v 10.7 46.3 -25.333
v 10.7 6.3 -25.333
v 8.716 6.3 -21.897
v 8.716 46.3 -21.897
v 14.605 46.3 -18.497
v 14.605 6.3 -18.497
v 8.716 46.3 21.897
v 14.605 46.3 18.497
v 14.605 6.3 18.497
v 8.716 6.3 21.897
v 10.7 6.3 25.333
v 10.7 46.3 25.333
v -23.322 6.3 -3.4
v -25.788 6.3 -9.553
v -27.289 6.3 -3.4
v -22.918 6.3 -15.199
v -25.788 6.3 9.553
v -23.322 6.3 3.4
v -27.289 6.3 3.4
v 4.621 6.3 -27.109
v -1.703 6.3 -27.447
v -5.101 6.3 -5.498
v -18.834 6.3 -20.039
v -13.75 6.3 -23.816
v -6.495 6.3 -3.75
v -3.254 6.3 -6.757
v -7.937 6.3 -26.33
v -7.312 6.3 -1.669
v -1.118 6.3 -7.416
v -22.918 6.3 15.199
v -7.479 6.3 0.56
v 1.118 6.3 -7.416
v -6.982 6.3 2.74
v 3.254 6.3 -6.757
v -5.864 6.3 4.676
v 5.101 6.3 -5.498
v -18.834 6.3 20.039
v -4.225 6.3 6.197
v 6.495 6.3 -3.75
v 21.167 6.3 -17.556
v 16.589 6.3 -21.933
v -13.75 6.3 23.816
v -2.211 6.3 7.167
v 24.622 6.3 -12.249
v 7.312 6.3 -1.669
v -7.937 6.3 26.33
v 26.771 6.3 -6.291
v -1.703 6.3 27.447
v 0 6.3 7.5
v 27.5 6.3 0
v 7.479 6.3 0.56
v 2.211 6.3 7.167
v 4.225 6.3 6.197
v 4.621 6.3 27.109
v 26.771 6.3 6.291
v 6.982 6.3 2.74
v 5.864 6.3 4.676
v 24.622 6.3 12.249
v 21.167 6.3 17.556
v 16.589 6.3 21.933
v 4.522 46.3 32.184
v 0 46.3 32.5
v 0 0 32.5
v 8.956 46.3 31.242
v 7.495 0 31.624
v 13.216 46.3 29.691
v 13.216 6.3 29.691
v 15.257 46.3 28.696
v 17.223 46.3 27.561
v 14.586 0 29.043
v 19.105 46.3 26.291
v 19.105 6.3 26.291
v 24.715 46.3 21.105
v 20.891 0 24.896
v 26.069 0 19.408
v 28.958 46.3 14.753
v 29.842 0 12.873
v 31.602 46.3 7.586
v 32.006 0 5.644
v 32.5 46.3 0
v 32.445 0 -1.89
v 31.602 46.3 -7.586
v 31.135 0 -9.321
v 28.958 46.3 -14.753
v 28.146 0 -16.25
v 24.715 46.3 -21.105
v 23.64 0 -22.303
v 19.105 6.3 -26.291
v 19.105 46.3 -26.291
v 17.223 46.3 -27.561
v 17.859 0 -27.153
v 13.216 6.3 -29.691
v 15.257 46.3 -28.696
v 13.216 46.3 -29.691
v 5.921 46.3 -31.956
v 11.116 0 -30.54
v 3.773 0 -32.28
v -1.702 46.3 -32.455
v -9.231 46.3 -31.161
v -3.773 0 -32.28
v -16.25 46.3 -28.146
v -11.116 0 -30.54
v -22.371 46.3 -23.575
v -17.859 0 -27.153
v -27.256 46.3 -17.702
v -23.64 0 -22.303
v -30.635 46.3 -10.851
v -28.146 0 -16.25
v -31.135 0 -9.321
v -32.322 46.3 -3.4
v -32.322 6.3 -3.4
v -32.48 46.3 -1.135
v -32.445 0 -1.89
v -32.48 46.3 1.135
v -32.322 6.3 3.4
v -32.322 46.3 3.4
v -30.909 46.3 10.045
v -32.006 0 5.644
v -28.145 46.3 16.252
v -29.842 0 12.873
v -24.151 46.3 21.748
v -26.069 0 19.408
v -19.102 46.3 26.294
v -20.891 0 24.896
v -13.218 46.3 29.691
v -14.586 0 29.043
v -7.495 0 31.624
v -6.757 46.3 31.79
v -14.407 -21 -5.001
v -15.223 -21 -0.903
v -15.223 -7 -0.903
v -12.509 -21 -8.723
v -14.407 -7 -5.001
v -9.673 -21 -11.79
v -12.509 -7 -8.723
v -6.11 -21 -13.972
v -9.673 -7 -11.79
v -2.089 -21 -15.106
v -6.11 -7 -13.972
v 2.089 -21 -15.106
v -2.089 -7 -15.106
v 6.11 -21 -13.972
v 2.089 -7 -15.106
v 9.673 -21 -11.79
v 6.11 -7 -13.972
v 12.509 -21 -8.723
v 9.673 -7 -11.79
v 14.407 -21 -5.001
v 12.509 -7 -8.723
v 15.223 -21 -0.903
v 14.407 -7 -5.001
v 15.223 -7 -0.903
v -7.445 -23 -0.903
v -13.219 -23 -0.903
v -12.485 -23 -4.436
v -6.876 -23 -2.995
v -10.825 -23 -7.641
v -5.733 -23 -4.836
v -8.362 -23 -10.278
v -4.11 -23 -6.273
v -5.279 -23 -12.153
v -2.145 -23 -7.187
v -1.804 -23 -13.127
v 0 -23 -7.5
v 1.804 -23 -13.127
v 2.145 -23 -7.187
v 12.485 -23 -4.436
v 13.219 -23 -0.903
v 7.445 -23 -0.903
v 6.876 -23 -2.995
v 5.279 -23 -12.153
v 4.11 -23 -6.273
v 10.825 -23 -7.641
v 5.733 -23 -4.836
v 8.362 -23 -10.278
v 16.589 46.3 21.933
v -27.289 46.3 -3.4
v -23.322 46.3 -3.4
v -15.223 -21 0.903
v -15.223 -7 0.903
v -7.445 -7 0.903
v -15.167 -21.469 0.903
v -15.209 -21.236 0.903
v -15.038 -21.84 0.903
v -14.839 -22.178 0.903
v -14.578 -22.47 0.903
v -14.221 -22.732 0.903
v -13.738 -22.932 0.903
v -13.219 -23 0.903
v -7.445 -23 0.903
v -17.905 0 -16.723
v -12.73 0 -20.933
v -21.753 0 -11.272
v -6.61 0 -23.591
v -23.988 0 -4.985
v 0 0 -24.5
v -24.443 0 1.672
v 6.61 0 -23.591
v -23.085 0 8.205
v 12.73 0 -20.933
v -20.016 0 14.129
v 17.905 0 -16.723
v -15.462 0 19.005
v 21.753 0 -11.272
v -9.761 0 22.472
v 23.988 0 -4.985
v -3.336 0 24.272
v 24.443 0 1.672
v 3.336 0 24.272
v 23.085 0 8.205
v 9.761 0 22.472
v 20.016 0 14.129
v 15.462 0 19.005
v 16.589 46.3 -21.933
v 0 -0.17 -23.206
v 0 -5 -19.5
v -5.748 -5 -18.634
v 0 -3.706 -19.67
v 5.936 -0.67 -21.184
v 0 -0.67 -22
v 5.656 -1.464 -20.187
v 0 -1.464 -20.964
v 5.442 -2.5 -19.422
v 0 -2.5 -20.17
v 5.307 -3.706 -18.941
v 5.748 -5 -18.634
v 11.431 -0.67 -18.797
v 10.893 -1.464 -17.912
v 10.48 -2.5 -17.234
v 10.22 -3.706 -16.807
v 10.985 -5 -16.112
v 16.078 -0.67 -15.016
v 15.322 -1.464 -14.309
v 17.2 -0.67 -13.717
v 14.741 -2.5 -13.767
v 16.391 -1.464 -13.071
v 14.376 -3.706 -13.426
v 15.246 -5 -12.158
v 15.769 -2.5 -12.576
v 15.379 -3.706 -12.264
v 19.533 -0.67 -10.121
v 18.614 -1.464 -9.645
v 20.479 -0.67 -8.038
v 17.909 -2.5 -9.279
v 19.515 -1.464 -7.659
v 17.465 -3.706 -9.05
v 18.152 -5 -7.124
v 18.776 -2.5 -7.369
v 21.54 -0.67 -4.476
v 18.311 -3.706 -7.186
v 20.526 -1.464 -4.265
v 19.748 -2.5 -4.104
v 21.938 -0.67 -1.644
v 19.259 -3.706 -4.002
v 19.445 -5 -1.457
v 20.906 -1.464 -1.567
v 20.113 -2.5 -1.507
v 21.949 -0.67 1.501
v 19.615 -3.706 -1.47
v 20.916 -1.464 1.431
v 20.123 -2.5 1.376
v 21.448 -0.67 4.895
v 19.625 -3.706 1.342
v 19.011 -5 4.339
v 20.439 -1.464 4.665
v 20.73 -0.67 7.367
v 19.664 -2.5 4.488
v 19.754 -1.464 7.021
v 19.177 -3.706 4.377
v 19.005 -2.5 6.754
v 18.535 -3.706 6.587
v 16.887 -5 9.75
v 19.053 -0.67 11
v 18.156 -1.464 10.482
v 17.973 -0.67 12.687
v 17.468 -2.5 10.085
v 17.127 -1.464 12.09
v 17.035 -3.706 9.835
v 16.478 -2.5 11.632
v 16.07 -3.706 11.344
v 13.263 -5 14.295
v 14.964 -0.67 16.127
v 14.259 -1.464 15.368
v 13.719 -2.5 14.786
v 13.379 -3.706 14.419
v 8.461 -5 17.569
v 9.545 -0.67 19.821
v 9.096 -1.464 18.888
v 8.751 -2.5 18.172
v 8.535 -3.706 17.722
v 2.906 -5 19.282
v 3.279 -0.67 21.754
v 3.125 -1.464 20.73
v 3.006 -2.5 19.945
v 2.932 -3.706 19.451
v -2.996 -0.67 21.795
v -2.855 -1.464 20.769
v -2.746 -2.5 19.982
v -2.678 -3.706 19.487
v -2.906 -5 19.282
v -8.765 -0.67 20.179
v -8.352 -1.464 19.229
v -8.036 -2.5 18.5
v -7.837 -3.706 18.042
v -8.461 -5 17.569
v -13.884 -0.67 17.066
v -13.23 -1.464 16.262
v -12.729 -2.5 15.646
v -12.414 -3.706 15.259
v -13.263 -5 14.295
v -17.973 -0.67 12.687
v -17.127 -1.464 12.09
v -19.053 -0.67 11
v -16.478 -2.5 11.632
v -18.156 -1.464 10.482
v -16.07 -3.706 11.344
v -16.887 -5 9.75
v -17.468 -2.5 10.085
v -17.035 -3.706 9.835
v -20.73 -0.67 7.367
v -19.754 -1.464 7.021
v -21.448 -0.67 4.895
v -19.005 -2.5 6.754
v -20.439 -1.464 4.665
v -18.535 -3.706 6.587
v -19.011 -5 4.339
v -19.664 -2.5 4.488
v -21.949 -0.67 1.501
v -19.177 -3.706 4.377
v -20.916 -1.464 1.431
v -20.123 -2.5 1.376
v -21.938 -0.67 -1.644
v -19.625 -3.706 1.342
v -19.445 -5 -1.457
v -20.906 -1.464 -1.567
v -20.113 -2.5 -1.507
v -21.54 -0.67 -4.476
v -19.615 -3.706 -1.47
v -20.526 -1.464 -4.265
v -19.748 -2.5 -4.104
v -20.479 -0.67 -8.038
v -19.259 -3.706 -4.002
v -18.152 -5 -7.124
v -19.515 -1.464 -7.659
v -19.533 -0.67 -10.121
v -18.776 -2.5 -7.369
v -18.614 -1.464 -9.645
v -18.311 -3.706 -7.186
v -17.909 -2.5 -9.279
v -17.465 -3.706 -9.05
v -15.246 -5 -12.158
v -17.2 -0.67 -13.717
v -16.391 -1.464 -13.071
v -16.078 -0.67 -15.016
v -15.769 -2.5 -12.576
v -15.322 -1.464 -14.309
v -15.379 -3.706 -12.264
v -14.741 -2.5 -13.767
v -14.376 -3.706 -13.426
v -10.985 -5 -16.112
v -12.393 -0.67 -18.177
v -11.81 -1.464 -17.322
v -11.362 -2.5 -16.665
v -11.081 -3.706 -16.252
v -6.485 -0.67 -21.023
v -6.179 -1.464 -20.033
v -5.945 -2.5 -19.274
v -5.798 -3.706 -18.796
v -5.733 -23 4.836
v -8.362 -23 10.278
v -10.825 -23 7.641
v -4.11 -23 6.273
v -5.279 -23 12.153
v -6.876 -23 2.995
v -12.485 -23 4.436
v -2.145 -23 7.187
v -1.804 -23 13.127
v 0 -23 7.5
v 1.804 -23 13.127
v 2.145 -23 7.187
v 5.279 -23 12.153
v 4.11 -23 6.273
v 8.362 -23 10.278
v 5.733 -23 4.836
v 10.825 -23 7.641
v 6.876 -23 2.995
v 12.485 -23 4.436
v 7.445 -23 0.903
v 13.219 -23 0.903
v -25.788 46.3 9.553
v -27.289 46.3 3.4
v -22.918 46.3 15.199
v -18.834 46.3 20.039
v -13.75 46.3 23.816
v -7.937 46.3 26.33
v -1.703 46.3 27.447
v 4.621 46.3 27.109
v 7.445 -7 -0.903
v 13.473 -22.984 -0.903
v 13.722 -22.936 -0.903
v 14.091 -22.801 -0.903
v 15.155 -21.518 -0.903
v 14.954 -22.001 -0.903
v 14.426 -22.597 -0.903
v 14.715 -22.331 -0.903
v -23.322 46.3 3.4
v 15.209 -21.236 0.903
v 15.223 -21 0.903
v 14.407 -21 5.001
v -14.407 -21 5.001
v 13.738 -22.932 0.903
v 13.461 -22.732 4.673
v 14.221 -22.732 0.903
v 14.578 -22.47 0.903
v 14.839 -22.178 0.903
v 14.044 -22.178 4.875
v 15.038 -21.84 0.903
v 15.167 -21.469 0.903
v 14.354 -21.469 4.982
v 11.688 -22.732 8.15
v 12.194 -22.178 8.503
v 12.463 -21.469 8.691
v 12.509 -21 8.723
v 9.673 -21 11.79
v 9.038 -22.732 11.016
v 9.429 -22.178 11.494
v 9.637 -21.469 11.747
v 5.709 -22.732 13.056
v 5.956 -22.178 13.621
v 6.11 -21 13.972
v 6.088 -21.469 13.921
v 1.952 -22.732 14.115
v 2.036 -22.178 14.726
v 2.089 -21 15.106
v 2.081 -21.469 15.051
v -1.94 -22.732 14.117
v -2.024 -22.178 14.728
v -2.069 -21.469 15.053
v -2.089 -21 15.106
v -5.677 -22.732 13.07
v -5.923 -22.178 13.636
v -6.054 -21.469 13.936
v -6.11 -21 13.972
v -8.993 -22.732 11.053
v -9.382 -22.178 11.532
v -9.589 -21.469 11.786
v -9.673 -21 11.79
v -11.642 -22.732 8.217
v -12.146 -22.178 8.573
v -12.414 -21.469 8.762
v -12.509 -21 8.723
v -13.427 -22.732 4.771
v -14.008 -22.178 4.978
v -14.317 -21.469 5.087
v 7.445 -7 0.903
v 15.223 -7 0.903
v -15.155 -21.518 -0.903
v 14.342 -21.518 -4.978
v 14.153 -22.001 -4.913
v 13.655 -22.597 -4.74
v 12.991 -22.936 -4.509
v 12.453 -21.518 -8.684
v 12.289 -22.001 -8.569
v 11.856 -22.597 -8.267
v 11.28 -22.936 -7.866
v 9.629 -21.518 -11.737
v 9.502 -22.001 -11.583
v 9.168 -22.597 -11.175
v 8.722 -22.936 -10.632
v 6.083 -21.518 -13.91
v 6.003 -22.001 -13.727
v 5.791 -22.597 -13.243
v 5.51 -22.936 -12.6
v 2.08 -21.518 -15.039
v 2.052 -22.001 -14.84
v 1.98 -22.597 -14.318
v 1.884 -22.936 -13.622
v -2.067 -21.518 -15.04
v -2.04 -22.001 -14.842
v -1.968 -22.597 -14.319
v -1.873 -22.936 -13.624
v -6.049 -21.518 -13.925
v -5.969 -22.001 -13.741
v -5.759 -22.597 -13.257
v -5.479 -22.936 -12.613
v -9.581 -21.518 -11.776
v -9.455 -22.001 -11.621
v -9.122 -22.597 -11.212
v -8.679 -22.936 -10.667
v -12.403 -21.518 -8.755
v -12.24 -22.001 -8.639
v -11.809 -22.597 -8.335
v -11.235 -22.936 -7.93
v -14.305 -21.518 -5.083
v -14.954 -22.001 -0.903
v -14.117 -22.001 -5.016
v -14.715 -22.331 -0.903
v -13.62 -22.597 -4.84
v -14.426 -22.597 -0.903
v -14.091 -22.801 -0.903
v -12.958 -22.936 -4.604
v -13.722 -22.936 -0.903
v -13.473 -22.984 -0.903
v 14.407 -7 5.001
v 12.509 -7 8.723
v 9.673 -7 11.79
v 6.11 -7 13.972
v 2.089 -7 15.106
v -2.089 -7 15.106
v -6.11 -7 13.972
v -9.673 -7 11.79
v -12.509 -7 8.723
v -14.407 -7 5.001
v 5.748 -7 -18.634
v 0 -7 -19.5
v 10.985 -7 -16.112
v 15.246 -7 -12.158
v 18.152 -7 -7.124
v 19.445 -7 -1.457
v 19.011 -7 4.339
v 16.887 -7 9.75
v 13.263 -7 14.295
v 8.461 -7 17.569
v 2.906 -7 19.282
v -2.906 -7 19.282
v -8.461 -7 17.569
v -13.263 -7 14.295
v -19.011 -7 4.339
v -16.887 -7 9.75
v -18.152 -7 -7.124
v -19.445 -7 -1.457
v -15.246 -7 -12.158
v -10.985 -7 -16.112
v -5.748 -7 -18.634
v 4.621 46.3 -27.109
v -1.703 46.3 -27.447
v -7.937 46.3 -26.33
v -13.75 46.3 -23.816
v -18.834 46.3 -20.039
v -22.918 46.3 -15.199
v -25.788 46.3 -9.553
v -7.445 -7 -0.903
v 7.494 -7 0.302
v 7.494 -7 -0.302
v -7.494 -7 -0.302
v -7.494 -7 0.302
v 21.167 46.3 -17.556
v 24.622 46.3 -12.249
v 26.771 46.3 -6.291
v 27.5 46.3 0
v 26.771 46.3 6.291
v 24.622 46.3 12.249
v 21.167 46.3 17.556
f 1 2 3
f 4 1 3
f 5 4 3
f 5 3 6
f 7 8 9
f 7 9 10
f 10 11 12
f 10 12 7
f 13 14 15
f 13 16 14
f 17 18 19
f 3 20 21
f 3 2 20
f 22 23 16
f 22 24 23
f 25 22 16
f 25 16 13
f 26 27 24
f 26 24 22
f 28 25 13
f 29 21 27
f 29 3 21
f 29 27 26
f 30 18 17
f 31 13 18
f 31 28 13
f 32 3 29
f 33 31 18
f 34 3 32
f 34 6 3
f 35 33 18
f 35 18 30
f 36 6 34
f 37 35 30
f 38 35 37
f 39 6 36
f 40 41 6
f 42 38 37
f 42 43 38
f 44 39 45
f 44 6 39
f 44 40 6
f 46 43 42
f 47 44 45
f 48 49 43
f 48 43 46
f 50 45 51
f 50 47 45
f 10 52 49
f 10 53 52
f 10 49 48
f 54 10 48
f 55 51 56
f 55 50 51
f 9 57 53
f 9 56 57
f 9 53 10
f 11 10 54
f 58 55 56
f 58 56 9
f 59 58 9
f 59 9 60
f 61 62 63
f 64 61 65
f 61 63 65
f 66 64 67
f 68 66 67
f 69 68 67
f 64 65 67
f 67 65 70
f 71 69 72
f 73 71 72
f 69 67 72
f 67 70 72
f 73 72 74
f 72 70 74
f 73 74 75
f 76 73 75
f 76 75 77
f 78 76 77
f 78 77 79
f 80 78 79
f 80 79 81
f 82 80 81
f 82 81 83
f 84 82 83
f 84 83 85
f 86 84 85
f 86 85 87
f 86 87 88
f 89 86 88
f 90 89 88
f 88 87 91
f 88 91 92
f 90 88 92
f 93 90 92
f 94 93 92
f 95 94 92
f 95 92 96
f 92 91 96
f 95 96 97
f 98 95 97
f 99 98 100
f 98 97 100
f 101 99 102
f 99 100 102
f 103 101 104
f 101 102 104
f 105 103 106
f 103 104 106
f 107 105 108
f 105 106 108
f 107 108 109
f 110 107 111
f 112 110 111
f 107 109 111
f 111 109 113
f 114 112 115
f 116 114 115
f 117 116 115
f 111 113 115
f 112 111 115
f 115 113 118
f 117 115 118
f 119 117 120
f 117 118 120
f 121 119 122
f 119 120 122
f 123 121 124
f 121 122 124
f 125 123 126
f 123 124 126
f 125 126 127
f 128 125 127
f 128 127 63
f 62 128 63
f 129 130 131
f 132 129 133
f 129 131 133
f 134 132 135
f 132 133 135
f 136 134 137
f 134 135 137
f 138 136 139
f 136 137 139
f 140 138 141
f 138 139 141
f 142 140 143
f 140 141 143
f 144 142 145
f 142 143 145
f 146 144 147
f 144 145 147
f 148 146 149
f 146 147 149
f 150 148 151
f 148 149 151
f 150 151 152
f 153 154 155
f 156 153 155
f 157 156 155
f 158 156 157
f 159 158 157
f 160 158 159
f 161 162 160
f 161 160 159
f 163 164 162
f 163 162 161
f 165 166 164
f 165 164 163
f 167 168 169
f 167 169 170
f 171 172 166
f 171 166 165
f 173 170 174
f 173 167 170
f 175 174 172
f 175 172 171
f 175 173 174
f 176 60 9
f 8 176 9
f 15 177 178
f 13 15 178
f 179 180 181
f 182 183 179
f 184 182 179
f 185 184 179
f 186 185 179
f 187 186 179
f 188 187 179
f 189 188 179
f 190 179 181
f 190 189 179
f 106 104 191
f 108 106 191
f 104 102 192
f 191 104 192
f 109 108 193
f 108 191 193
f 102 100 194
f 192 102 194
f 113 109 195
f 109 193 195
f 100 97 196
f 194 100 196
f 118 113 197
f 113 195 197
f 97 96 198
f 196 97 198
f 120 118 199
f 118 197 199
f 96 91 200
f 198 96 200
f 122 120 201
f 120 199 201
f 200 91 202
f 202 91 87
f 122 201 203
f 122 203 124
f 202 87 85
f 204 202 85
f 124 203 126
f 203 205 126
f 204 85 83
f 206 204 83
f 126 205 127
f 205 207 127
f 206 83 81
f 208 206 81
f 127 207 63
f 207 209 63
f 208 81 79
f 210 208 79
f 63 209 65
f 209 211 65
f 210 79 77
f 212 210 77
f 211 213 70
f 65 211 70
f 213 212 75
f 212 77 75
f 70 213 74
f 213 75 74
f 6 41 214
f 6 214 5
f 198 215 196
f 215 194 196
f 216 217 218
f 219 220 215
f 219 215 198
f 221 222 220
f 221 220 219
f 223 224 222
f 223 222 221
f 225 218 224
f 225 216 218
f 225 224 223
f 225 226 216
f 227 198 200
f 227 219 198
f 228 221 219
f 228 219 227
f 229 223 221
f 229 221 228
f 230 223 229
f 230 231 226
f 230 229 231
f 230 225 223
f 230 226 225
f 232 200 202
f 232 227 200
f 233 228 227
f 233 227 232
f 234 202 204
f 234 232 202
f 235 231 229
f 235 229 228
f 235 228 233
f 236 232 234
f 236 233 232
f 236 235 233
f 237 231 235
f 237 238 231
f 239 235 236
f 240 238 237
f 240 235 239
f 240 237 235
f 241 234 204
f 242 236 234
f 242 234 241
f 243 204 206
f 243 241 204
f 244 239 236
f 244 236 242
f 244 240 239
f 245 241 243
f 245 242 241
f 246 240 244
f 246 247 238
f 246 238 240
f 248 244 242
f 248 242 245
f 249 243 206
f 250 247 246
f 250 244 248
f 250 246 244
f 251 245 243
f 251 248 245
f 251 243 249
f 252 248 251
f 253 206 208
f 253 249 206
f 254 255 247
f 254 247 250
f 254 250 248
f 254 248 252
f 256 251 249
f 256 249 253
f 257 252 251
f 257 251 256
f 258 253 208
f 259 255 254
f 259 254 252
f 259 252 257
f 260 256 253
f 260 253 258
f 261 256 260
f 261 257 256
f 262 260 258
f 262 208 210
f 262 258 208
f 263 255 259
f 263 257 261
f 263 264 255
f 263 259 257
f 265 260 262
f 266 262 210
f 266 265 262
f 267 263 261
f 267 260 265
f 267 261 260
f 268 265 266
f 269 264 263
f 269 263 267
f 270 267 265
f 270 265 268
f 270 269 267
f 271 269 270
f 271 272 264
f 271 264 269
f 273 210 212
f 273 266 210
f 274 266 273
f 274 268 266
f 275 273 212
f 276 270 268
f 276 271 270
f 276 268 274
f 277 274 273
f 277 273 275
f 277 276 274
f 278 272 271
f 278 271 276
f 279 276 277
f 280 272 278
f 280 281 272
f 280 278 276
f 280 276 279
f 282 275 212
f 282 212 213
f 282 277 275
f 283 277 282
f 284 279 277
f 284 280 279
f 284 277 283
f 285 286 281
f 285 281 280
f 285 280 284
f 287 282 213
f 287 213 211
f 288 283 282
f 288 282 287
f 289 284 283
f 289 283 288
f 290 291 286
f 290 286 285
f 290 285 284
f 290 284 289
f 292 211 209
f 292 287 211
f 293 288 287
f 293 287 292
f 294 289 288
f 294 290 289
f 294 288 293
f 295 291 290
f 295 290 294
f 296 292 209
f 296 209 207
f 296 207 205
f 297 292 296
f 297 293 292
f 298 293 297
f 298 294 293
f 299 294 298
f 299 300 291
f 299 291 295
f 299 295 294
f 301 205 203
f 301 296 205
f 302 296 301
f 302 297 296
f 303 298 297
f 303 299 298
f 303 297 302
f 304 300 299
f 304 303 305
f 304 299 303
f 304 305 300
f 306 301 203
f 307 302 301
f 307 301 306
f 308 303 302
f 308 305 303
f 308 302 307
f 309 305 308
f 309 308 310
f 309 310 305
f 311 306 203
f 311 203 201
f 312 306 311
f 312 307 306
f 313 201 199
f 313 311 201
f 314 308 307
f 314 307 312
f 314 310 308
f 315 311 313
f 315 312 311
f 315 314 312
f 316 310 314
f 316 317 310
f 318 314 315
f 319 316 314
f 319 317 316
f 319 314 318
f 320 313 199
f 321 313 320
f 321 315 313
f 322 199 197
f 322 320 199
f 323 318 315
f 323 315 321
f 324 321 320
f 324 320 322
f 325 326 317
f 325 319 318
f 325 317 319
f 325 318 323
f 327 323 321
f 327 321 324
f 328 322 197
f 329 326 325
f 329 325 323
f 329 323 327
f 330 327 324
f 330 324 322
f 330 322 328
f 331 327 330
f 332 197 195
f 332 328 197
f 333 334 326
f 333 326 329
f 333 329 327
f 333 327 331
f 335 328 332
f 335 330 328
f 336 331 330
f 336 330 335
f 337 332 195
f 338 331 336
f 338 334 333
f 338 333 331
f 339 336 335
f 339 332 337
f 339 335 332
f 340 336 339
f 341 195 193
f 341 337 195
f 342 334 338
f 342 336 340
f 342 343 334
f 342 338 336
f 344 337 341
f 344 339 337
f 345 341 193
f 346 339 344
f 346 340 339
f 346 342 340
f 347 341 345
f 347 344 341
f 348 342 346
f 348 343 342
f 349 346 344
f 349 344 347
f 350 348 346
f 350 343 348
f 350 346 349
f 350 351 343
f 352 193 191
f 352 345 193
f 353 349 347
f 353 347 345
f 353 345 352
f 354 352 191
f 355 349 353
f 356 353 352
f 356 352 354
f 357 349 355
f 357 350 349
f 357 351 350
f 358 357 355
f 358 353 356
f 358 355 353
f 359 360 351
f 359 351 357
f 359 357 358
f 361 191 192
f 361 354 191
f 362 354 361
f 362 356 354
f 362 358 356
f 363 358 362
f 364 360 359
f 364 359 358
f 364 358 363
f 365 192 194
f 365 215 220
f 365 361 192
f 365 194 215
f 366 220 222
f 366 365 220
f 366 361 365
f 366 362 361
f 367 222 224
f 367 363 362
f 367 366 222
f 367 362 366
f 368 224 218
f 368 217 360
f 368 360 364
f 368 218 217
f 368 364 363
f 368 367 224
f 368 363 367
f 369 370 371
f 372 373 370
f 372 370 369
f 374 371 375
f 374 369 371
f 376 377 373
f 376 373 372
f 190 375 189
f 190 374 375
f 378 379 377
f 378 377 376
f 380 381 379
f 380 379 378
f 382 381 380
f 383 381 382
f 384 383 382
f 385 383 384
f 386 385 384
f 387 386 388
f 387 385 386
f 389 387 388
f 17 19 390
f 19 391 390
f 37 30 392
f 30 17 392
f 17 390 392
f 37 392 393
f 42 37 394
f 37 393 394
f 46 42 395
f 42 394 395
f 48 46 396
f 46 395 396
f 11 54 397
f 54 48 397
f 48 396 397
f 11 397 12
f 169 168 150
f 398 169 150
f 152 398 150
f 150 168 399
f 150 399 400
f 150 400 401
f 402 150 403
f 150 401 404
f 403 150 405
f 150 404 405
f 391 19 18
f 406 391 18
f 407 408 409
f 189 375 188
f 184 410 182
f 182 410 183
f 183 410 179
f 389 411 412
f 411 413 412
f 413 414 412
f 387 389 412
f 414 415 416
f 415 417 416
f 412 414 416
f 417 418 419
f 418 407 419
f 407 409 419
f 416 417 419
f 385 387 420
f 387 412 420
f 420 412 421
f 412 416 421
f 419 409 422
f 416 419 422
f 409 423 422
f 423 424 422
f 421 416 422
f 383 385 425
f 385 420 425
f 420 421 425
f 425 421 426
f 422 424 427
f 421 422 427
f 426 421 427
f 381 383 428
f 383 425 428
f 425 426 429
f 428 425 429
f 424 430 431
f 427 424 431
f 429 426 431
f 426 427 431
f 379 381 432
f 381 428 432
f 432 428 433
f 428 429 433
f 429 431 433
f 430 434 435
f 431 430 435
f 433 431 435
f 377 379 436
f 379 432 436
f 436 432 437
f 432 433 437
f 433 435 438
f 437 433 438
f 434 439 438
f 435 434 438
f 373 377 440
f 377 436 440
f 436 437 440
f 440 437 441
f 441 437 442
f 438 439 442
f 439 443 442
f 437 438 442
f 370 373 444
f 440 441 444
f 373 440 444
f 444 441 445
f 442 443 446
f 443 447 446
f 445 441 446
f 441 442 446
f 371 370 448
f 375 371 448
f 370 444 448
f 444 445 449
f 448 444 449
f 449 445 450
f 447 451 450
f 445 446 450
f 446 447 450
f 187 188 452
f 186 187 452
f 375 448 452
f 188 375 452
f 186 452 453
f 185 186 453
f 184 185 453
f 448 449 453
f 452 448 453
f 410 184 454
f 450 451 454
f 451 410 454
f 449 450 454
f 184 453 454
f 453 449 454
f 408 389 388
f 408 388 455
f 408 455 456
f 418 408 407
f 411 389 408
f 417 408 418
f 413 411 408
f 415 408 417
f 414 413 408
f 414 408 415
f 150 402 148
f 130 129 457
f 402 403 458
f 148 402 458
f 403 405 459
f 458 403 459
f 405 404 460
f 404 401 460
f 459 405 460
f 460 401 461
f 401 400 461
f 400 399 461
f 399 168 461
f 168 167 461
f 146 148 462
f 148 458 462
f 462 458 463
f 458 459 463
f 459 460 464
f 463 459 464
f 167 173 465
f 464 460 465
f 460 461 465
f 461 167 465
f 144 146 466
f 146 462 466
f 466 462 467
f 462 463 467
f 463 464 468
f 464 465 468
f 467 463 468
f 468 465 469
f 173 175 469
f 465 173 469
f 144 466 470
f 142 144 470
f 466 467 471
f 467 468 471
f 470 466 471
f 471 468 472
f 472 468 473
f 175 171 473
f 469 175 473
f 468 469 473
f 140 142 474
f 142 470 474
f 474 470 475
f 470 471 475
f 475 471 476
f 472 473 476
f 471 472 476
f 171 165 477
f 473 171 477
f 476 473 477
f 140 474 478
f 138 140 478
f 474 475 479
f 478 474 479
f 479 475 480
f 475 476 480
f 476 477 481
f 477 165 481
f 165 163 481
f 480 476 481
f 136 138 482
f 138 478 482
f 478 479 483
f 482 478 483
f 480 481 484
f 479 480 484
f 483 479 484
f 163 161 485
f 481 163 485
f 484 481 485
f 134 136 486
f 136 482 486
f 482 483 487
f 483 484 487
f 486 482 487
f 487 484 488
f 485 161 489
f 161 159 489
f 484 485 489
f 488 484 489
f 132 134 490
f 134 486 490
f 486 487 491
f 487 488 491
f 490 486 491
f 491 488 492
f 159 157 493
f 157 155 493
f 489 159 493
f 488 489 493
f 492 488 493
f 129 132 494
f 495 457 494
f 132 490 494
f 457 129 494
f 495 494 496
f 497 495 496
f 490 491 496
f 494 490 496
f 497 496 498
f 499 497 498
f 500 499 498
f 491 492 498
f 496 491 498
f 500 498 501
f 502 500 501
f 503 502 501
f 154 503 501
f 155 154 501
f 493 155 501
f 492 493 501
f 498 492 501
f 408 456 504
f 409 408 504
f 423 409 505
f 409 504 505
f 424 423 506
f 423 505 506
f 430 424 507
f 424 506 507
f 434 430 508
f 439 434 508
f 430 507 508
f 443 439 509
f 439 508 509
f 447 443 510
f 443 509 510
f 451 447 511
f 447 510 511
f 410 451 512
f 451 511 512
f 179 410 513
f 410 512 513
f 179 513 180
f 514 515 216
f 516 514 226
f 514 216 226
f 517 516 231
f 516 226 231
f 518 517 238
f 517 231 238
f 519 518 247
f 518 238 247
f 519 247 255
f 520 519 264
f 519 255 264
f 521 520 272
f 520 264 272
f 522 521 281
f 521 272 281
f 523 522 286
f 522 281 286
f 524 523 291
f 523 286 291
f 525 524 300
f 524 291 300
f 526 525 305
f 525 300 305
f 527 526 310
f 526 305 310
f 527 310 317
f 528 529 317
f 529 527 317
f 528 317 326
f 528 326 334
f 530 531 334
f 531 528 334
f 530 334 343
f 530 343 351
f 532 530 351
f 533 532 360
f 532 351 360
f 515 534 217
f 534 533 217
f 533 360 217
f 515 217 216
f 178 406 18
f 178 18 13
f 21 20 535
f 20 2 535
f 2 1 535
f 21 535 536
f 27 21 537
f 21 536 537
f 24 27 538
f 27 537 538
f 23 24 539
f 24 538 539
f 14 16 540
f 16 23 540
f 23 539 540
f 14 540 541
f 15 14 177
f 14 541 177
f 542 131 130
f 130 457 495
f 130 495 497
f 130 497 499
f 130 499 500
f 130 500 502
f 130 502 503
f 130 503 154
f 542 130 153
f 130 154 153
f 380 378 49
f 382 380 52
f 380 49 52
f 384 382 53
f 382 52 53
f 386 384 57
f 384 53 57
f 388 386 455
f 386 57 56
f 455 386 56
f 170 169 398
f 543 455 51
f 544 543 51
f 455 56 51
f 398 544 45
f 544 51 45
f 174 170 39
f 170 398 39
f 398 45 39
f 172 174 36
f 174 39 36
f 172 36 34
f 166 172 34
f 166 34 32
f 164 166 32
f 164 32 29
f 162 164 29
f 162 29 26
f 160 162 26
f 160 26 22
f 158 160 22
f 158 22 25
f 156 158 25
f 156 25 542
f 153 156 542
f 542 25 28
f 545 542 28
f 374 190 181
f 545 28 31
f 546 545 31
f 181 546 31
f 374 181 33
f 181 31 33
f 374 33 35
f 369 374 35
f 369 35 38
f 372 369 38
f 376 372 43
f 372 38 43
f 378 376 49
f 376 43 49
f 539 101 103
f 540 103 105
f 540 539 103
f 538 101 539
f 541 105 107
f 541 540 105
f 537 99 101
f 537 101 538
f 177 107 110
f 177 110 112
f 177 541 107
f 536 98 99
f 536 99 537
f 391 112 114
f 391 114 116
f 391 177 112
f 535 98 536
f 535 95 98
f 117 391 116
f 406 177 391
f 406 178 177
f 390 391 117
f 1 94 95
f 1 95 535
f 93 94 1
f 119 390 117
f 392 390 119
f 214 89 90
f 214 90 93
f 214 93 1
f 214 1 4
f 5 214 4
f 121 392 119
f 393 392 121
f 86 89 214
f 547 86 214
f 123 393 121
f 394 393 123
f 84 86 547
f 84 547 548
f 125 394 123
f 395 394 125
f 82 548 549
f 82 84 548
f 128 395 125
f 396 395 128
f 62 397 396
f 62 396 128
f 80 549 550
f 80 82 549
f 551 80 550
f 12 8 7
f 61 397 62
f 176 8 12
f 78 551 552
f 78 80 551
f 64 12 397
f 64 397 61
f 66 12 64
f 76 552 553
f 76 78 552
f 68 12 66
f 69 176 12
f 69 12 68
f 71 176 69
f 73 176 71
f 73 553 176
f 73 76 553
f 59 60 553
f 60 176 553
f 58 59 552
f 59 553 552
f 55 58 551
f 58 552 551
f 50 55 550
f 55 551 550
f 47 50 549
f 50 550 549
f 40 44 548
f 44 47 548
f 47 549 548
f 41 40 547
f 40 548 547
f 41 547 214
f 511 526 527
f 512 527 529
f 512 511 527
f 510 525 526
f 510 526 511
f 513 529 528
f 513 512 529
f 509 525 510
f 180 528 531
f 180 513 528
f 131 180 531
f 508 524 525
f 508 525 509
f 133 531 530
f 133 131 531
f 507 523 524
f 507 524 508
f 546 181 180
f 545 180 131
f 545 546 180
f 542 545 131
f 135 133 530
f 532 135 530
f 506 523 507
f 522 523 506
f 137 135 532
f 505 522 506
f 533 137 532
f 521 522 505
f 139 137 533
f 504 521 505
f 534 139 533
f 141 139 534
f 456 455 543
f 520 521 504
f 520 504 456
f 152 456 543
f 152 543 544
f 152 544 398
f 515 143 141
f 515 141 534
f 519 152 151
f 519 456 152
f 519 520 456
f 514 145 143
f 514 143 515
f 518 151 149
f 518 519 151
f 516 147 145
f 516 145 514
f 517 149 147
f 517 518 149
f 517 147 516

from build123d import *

# Parameters (mm, degrees)
SKETCH1_R           = 32.5
BOSS_EXTRUDE1_DEPTH = 46.3
SKETCH2_R           = 27.5
CUT_EXTRUDE1_DEPTH  = 40
SKETCH3_R           = 19.5
BOSS_EXTRUDE2_DEPTH = 7
SKETCH4_R           = 15.25
BOSS_EXTRUDE3_DEPTH = 16
FILLET1_R           = 5
SKETCH7_W           = 66.193685288
SKETCH7_H           = 1.806726502
CUT_EXTRUDE2_DEPTH  = 16
FILLET2_R           = 2
SKETCH9_W           = 9
SKETCH9_H           = 6.8
BOSS_EXTRUDE4_DEPTH = 40
SKETCH8_R           = 7.5
CUT_EXTRUDE3_DEPTH  = 61.930288035
CIRPATTERN1_COUNT   = 3


with BuildPart() as part:
    # Sketch1 → Boss-Extrude1 (new body)
    with BuildSketch(Plane(origin=(0, 0, 0), x_dir=(1, 0, 0), z_dir=(0, 1, 0))):
        with Locations(Location((0, 0, 0), (0, 0, 270))):
            Circle(SKETCH1_R)
    extrude(amount=BOSS_EXTRUDE1_DEPTH)

    # Sketch2 → Cut-Extrude1 (cut)
    with BuildSketch(Plane(origin=(0, 46.3, 0), x_dir=(1, 0, 0), z_dir=(0, 1, 0))):
        with Locations(Location((0, 0, 0), (0, 0, 270))):
            Circle(SKETCH2_R)
    extrude(amount=-CUT_EXTRUDE1_DEPTH, mode=Mode.SUBTRACT)

    # Sketch3 → Boss-Extrude2 (add)
    with BuildSketch(Plane.XZ):
        with Locations(Location((0, 0, 0), (0, 0, 270))):
            Circle(SKETCH3_R)
    extrude(amount=BOSS_EXTRUDE2_DEPTH)

    # Sketch4 → Boss-Extrude3 (add)
    with BuildSketch(Plane.XZ.offset(7)):
        with Locations(Location((0, 0, 0), (0, 0, 270))):
            Circle(SKETCH4_R)
    extrude(amount=BOSS_EXTRUDE3_DEPTH)

    # Fillet1
    fillet1_edges = [part.edges().sort_by_distance(p)[0] for p in [
        (0, 0, 19.5),
    ]]
    fillet(fillet1_edges, radius=FILLET1_R)

    # Sketch7 → Cut-Extrude2 (cut)
    with BuildSketch(Plane.XZ.offset(23)):
        Rectangle(SKETCH7_W, SKETCH7_H)
    extrude(amount=-CUT_EXTRUDE2_DEPTH, mode=Mode.SUBTRACT)

    # Fillet2
    fillet2_edges = [part.edges().sort_by_distance(p)[0] for p in [
        (0, -23, 15.25),
        (0, -23, -15.25),
    ]]
    fillet(fillet2_edges, radius=FILLET2_R)

    # Sketch9 → Boss-Extrude4 (add)
    with BuildSketch(Plane(origin=(0, 46.3, 0), x_dir=(1, 0, 0), z_dir=(0, 1, 0))):
        with Locations((-27.821664561, 0)):
            Rectangle(SKETCH9_W, SKETCH9_H)
    boss_extrude4 = extrude(amount=-BOSS_EXTRUDE4_DEPTH)

    # Sketch8 → Cut-Extrude3 (cut, through all)
    with BuildSketch(Plane(origin=(0, 6.3, 0), x_dir=(1, 0, 0), z_dir=(0, 1, 0))):
        with Locations(Location((0, 0, 0), (0, 0, 270))):
            Circle(SKETCH8_R)
    extrude(amount=-CUT_EXTRUDE3_DEPTH, mode=Mode.SUBTRACT)

    # CirPattern1: Boss-Extrude4 ×3 about axis
    cirpattern1_axis = Axis((0, 0, 0), (0, 1, 0))
    for i in range(1, CIRPATTERN1_COUNT):
        add(boss_extrude4.rotate(cirpattern1_axis, i * 360 / CIRPATTERN1_COUNT))


solid = part.part
